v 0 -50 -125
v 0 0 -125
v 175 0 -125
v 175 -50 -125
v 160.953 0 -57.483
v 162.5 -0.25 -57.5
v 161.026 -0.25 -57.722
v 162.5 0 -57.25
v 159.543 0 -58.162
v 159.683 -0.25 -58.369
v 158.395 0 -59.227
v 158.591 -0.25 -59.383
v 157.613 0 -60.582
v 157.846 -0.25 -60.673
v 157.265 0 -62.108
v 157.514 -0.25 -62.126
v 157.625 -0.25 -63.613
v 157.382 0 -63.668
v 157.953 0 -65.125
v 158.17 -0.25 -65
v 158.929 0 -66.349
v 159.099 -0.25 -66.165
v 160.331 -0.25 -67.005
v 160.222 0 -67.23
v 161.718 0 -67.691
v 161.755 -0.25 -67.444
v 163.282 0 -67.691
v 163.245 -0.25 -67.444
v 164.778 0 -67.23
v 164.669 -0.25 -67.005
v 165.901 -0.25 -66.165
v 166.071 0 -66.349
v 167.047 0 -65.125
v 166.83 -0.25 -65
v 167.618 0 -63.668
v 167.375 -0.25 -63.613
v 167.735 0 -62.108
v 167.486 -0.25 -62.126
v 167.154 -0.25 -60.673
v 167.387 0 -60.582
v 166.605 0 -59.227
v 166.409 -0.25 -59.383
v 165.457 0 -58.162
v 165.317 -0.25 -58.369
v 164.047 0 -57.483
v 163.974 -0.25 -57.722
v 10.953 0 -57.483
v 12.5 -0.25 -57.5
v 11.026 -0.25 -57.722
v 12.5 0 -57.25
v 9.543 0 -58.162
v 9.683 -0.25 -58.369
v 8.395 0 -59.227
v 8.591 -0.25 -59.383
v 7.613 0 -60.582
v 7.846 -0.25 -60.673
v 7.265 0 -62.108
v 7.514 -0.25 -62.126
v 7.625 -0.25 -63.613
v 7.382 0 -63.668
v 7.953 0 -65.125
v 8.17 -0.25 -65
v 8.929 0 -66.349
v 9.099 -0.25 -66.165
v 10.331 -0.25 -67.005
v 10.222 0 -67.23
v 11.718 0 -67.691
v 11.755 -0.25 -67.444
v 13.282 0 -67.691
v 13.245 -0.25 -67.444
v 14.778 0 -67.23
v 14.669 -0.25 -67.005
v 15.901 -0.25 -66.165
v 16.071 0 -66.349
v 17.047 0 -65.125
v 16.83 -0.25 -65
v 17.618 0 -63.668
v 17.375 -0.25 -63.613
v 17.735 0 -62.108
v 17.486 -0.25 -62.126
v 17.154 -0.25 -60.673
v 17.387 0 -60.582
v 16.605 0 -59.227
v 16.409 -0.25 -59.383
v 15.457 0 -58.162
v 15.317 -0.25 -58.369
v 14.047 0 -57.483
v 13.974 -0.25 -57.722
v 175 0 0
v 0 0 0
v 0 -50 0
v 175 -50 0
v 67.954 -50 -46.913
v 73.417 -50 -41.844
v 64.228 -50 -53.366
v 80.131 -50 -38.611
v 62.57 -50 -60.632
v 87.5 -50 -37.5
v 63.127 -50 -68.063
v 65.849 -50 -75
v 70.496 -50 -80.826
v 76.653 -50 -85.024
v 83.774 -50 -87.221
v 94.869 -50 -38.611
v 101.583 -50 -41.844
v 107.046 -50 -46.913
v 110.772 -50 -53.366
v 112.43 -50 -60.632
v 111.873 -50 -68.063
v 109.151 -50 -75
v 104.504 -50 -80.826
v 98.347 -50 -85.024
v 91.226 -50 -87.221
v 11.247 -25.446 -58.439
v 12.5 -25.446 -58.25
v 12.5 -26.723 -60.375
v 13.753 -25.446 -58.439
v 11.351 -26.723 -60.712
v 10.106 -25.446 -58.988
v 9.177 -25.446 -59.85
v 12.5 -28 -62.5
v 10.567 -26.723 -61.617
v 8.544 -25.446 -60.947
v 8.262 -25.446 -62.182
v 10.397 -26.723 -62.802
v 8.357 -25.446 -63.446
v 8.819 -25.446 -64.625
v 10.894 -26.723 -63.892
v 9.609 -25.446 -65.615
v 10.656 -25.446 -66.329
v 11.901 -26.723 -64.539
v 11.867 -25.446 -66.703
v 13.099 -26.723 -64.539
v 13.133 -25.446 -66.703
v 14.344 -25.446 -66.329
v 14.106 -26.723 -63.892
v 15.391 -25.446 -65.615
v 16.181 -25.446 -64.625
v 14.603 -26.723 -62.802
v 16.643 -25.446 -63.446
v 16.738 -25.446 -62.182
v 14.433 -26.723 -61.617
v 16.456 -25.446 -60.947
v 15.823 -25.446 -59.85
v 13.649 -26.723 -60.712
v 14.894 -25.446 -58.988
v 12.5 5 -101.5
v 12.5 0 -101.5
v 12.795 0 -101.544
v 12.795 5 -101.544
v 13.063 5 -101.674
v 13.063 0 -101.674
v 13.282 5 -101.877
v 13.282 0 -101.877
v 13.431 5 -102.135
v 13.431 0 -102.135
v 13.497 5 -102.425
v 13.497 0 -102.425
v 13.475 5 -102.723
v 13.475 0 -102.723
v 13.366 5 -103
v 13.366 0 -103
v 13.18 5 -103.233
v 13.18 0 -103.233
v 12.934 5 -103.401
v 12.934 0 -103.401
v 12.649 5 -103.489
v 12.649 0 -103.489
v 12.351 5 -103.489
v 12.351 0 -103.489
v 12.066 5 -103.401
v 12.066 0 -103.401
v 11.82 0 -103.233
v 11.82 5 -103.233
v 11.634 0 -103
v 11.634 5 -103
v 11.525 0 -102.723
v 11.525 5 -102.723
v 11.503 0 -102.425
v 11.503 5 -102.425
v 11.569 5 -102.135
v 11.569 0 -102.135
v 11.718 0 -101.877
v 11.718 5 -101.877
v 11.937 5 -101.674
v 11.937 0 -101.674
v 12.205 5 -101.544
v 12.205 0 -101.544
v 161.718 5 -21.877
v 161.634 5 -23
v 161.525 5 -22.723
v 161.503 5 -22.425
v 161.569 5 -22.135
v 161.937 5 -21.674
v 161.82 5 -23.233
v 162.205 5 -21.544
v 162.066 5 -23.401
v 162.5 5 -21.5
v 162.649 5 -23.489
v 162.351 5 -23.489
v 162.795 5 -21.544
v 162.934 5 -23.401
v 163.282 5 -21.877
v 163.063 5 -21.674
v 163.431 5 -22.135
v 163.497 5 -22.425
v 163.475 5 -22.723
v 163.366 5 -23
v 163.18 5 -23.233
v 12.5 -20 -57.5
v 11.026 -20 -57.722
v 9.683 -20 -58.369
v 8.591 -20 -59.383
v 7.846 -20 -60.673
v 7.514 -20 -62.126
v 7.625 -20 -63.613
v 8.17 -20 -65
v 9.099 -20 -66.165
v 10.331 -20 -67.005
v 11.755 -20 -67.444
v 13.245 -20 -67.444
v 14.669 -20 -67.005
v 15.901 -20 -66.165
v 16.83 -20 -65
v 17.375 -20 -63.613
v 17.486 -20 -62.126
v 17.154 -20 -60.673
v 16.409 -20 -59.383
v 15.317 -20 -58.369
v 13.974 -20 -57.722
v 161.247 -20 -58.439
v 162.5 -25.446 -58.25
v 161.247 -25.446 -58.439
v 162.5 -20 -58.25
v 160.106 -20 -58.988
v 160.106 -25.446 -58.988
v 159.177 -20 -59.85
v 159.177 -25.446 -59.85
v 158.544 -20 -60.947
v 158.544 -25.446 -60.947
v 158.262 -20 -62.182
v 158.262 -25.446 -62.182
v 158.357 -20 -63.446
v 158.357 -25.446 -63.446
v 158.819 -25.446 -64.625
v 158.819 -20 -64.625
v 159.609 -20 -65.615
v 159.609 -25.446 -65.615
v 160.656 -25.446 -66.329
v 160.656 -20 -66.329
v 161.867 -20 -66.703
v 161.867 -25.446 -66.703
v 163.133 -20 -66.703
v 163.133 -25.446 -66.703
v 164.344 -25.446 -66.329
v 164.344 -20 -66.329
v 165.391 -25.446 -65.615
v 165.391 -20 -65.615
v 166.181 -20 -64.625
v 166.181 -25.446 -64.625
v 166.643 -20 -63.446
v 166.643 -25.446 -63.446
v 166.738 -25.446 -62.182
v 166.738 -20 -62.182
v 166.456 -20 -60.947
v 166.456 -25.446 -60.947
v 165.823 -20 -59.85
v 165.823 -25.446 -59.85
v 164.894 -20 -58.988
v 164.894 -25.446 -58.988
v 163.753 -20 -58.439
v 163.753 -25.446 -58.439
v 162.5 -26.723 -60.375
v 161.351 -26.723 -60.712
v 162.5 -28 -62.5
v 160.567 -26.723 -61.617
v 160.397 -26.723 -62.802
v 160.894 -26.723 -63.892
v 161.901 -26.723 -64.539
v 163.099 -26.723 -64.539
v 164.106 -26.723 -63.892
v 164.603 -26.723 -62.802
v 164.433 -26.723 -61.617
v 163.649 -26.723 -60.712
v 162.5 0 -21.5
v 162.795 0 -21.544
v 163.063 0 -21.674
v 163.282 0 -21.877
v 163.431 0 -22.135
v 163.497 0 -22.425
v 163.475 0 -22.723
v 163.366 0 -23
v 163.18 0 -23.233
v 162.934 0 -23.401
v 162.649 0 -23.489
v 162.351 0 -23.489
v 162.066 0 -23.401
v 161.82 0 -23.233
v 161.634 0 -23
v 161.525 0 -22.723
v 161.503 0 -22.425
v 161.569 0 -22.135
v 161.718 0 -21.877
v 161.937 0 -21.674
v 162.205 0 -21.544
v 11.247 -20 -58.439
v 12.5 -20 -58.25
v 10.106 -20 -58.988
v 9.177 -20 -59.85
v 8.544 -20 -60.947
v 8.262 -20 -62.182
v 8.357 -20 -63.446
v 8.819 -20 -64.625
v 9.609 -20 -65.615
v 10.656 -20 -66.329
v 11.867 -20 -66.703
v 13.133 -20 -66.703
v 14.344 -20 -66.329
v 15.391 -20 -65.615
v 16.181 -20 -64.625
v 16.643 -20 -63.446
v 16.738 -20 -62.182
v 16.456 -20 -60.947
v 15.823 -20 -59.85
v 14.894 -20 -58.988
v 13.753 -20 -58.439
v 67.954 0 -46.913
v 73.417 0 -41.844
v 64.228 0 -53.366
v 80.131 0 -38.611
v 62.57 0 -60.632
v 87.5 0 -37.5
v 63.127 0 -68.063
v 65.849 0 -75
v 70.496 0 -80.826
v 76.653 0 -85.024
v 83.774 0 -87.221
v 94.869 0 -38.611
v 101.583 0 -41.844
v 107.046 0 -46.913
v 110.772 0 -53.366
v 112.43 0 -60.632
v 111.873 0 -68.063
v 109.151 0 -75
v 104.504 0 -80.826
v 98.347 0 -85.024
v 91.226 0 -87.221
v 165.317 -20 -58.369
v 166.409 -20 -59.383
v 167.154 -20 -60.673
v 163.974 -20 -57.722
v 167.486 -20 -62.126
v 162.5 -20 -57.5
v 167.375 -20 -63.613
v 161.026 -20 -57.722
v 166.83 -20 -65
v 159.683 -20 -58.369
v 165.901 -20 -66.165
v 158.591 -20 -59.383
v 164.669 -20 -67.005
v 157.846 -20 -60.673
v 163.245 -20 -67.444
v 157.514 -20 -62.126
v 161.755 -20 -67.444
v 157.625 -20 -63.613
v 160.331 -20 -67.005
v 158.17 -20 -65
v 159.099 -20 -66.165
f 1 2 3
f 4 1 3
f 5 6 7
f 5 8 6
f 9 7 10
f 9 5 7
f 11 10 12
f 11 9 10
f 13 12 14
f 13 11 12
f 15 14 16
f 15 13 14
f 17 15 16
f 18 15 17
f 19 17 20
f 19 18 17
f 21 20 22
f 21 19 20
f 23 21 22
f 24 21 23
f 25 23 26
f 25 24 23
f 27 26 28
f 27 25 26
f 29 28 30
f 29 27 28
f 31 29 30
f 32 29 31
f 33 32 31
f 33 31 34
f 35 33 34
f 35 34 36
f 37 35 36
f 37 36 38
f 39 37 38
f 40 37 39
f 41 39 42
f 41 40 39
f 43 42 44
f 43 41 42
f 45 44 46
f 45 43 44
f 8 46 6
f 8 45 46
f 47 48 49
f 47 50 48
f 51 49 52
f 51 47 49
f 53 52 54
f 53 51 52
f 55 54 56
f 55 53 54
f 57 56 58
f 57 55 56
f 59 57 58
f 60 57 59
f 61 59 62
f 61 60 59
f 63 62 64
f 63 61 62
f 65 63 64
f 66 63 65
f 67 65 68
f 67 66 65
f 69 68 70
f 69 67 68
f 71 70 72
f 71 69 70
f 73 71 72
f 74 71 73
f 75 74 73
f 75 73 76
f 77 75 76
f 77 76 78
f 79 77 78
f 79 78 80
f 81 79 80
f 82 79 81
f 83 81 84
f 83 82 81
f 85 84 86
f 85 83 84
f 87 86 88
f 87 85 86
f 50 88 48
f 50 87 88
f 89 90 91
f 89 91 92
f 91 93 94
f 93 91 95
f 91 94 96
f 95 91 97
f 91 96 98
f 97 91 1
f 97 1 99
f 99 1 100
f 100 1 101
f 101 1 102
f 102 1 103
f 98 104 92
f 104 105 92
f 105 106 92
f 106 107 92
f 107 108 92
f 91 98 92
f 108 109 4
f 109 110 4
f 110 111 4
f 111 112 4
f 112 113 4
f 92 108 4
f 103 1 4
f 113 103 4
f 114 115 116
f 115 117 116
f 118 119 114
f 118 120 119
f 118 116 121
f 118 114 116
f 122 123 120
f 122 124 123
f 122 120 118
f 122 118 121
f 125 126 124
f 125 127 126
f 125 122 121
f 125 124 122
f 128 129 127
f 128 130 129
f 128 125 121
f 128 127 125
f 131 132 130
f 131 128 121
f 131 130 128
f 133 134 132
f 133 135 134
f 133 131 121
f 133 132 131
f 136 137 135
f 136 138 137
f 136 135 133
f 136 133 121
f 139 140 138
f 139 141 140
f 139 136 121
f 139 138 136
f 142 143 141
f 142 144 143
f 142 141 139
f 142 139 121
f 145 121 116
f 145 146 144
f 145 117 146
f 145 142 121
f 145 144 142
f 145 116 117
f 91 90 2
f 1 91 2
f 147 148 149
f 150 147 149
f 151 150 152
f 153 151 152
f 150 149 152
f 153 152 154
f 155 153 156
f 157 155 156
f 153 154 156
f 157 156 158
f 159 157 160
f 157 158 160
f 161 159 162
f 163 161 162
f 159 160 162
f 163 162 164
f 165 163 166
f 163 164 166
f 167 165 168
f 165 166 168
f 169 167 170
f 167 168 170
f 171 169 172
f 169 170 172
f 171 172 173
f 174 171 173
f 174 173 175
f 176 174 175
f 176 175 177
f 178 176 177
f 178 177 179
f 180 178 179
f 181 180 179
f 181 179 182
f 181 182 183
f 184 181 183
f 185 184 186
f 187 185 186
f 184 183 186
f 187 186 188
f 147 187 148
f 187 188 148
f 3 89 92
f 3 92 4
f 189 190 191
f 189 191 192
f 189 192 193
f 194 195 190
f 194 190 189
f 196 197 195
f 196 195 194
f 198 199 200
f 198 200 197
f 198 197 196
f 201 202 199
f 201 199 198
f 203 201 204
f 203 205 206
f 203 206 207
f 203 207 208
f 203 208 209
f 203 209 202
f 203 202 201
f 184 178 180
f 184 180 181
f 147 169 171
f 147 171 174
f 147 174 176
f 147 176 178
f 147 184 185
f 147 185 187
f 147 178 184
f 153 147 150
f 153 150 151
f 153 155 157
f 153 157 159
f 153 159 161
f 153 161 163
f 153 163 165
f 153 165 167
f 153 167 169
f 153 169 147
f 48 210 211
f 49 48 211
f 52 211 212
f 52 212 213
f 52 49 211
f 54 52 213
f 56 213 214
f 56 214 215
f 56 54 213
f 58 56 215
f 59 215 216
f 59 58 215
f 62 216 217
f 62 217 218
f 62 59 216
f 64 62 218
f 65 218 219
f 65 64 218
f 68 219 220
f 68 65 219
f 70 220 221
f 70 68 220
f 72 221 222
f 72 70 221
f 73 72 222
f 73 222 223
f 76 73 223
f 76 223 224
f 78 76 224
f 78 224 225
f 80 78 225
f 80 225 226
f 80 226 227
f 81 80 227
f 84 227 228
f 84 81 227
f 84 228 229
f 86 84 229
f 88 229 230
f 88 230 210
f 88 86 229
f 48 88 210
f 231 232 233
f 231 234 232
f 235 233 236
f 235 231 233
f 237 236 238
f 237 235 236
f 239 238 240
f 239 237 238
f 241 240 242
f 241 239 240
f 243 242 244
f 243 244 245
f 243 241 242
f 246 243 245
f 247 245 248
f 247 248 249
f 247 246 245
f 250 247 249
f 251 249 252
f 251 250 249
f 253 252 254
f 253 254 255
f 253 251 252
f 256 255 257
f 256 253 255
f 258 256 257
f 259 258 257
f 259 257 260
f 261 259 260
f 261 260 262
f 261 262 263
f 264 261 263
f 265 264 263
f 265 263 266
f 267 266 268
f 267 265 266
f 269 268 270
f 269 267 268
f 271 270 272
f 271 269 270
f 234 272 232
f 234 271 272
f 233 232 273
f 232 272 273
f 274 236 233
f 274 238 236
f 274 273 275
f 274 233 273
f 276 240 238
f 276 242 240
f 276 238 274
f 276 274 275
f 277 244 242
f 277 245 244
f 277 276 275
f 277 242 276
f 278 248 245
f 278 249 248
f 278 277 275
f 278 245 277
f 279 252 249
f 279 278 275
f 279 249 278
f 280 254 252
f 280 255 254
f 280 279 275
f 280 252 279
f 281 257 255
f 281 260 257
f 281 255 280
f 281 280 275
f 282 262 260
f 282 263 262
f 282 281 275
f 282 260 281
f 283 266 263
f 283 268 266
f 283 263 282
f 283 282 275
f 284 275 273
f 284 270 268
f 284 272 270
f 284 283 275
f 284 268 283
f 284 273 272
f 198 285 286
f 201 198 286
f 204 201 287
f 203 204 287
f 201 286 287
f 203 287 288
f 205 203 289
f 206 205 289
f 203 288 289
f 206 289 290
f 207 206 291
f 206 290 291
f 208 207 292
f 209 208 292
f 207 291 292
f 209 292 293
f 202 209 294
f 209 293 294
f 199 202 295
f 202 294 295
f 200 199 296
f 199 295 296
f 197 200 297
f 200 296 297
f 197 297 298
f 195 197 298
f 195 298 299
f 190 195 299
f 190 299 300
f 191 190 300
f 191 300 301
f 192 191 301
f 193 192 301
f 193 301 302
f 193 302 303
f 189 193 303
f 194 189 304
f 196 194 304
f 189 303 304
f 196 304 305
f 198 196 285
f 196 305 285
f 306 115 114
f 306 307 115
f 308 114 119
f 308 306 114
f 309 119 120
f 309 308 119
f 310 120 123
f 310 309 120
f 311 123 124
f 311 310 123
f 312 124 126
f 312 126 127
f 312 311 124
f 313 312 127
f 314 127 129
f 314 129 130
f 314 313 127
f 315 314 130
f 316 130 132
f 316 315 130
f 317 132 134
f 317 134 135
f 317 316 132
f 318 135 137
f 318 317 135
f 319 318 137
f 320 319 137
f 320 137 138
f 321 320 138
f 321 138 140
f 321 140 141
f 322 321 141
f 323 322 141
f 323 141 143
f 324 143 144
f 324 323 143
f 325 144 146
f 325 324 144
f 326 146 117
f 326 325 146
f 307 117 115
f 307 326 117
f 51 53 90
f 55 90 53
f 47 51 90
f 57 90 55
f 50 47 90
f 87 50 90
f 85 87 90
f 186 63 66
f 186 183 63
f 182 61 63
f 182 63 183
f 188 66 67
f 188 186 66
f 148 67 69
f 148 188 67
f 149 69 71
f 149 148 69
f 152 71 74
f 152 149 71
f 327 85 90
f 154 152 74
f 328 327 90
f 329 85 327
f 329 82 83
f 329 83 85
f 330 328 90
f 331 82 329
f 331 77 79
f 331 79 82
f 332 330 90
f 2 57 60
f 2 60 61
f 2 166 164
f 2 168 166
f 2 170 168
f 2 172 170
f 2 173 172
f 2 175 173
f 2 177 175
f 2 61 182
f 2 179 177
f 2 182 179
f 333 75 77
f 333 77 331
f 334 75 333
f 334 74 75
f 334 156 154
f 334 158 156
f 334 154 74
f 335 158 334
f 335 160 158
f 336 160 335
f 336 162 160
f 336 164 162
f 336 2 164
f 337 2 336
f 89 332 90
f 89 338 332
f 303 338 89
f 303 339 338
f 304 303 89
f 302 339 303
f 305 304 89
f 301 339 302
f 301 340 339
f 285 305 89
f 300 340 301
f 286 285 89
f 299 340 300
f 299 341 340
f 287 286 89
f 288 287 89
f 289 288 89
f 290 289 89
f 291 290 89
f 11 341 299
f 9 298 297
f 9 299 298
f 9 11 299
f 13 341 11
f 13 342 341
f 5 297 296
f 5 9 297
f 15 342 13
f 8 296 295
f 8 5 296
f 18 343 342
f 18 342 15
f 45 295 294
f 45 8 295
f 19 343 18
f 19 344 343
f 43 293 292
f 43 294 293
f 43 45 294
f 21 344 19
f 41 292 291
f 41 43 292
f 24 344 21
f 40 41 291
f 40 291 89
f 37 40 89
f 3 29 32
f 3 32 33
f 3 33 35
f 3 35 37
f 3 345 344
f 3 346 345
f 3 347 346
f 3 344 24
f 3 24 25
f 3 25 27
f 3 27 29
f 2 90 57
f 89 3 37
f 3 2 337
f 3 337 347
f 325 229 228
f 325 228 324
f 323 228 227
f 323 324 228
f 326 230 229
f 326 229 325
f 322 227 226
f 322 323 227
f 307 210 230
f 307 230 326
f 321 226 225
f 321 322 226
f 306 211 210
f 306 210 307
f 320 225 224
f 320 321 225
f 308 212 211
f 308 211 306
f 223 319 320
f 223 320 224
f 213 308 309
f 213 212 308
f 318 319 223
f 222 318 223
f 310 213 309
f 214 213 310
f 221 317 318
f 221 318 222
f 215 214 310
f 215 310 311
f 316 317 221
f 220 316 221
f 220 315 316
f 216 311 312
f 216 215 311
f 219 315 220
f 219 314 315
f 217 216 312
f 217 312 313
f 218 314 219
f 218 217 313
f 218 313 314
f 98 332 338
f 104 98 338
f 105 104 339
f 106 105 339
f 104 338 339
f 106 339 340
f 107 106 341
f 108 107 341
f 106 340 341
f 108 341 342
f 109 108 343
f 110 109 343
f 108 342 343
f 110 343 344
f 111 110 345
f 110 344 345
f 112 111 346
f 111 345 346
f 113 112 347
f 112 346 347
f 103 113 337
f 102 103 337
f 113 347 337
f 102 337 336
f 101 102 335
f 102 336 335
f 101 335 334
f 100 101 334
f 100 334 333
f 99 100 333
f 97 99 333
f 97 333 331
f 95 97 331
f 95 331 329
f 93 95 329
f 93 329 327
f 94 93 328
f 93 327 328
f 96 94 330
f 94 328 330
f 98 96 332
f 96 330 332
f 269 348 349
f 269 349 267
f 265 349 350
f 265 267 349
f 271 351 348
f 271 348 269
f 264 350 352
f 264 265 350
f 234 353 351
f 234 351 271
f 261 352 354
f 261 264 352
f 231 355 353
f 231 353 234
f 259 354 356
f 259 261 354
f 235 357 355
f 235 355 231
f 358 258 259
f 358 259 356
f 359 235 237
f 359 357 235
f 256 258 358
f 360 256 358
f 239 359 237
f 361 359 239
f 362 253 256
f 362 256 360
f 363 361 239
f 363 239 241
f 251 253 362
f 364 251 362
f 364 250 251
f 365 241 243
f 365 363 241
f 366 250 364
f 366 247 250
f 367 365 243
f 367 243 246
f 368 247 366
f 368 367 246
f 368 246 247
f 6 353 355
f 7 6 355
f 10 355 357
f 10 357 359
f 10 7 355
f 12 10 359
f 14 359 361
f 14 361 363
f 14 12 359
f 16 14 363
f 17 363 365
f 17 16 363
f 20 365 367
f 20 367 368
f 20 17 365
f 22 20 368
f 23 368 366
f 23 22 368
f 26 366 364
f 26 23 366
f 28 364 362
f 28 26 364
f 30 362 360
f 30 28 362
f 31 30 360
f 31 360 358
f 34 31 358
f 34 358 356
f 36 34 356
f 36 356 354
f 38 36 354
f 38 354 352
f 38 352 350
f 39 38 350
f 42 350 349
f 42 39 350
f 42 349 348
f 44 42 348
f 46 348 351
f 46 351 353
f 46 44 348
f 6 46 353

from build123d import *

# Parameters (mm, degrees)
SKETCH1_W                                      = 175
SKETCH1_H                                      = 125
SKETCH1_R                                      = 25
BOSS_EXTRUDE1_DEPTH                            = 50
SKETCH1_4_R                                    = 1
BOSS_EXTRUDE2_DEPTH                            = 5
CBORE_FOR_M12_HEX_HEAD_MACHINE_SCREW1_AT_COUNT = 2
CBORE_FOR_M12_HEX_HEAD_MACHINE_SCREW1_AT_PITCH = 150


with BuildPart() as part:
    # Sketch1 → Boss-Extrude1 (new body)
    with BuildSketch(Plane(origin=(0, 0, 0), x_dir=(1, 0, 0), z_dir=(0, 1, 0))):
        with Locations((87.5, 62.5)):
            Rectangle(SKETCH1_W, SKETCH1_H)
        with Locations((87.5, 62.5)):
            Circle(SKETCH1_R, mode=Mode.SUBTRACT)
    extrude(amount=-BOSS_EXTRUDE1_DEPTH)

    # Sketch1<4> → Boss-Extrude2 (add)
    with BuildSketch(Plane(origin=(0, 0, 0), x_dir=(1, 0, 0), z_dir=(0, 1, 0))):
        with Locations((162.5, 22.5)):
            Circle(SKETCH1_4_R)
        with Locations((12.5, 102.5)):
            Circle(SKETCH1_4_R)
    extrude(amount=BOSS_EXTRUDE2_DEPTH)

    # Sketch5 → CBORE for M12 Hex Head Machine Screw1 (revolve, cut)
    with BuildSketch(Plane(origin=(12.5, 0, -62.5), x_dir=(0, 0, 1), z_dir=(1, 0, 0))):
        Polygon((0, 0), (0, 28), (4.25, 25.446342369), (4.25, 20), (5, 20), (5, 0.25), (5.25, 0), align=None)
    cbore_for_m12_hex_head_machine_screw1 = revolve(axis=Axis((12.5, 6.35, -62.5), (0, -1, 0)), mode=Mode.SUBTRACT)

    # CBORE for M12 Hex Head Machine Screw1 at: CBORE for M12 Hex Head Machine Screw1 ×2
    with Locations(*[(i * CBORE_FOR_M12_HEX_HEAD_MACHINE_SCREW1_AT_PITCH, 0, 0) for i in range(1, CBORE_FOR_M12_HEX_HEAD_MACHINE_SCREW1_AT_COUNT)]):
        add(cbore_for_m12_hex_head_machine_screw1, mode=Mode.SUBTRACT)


solid = part.part
